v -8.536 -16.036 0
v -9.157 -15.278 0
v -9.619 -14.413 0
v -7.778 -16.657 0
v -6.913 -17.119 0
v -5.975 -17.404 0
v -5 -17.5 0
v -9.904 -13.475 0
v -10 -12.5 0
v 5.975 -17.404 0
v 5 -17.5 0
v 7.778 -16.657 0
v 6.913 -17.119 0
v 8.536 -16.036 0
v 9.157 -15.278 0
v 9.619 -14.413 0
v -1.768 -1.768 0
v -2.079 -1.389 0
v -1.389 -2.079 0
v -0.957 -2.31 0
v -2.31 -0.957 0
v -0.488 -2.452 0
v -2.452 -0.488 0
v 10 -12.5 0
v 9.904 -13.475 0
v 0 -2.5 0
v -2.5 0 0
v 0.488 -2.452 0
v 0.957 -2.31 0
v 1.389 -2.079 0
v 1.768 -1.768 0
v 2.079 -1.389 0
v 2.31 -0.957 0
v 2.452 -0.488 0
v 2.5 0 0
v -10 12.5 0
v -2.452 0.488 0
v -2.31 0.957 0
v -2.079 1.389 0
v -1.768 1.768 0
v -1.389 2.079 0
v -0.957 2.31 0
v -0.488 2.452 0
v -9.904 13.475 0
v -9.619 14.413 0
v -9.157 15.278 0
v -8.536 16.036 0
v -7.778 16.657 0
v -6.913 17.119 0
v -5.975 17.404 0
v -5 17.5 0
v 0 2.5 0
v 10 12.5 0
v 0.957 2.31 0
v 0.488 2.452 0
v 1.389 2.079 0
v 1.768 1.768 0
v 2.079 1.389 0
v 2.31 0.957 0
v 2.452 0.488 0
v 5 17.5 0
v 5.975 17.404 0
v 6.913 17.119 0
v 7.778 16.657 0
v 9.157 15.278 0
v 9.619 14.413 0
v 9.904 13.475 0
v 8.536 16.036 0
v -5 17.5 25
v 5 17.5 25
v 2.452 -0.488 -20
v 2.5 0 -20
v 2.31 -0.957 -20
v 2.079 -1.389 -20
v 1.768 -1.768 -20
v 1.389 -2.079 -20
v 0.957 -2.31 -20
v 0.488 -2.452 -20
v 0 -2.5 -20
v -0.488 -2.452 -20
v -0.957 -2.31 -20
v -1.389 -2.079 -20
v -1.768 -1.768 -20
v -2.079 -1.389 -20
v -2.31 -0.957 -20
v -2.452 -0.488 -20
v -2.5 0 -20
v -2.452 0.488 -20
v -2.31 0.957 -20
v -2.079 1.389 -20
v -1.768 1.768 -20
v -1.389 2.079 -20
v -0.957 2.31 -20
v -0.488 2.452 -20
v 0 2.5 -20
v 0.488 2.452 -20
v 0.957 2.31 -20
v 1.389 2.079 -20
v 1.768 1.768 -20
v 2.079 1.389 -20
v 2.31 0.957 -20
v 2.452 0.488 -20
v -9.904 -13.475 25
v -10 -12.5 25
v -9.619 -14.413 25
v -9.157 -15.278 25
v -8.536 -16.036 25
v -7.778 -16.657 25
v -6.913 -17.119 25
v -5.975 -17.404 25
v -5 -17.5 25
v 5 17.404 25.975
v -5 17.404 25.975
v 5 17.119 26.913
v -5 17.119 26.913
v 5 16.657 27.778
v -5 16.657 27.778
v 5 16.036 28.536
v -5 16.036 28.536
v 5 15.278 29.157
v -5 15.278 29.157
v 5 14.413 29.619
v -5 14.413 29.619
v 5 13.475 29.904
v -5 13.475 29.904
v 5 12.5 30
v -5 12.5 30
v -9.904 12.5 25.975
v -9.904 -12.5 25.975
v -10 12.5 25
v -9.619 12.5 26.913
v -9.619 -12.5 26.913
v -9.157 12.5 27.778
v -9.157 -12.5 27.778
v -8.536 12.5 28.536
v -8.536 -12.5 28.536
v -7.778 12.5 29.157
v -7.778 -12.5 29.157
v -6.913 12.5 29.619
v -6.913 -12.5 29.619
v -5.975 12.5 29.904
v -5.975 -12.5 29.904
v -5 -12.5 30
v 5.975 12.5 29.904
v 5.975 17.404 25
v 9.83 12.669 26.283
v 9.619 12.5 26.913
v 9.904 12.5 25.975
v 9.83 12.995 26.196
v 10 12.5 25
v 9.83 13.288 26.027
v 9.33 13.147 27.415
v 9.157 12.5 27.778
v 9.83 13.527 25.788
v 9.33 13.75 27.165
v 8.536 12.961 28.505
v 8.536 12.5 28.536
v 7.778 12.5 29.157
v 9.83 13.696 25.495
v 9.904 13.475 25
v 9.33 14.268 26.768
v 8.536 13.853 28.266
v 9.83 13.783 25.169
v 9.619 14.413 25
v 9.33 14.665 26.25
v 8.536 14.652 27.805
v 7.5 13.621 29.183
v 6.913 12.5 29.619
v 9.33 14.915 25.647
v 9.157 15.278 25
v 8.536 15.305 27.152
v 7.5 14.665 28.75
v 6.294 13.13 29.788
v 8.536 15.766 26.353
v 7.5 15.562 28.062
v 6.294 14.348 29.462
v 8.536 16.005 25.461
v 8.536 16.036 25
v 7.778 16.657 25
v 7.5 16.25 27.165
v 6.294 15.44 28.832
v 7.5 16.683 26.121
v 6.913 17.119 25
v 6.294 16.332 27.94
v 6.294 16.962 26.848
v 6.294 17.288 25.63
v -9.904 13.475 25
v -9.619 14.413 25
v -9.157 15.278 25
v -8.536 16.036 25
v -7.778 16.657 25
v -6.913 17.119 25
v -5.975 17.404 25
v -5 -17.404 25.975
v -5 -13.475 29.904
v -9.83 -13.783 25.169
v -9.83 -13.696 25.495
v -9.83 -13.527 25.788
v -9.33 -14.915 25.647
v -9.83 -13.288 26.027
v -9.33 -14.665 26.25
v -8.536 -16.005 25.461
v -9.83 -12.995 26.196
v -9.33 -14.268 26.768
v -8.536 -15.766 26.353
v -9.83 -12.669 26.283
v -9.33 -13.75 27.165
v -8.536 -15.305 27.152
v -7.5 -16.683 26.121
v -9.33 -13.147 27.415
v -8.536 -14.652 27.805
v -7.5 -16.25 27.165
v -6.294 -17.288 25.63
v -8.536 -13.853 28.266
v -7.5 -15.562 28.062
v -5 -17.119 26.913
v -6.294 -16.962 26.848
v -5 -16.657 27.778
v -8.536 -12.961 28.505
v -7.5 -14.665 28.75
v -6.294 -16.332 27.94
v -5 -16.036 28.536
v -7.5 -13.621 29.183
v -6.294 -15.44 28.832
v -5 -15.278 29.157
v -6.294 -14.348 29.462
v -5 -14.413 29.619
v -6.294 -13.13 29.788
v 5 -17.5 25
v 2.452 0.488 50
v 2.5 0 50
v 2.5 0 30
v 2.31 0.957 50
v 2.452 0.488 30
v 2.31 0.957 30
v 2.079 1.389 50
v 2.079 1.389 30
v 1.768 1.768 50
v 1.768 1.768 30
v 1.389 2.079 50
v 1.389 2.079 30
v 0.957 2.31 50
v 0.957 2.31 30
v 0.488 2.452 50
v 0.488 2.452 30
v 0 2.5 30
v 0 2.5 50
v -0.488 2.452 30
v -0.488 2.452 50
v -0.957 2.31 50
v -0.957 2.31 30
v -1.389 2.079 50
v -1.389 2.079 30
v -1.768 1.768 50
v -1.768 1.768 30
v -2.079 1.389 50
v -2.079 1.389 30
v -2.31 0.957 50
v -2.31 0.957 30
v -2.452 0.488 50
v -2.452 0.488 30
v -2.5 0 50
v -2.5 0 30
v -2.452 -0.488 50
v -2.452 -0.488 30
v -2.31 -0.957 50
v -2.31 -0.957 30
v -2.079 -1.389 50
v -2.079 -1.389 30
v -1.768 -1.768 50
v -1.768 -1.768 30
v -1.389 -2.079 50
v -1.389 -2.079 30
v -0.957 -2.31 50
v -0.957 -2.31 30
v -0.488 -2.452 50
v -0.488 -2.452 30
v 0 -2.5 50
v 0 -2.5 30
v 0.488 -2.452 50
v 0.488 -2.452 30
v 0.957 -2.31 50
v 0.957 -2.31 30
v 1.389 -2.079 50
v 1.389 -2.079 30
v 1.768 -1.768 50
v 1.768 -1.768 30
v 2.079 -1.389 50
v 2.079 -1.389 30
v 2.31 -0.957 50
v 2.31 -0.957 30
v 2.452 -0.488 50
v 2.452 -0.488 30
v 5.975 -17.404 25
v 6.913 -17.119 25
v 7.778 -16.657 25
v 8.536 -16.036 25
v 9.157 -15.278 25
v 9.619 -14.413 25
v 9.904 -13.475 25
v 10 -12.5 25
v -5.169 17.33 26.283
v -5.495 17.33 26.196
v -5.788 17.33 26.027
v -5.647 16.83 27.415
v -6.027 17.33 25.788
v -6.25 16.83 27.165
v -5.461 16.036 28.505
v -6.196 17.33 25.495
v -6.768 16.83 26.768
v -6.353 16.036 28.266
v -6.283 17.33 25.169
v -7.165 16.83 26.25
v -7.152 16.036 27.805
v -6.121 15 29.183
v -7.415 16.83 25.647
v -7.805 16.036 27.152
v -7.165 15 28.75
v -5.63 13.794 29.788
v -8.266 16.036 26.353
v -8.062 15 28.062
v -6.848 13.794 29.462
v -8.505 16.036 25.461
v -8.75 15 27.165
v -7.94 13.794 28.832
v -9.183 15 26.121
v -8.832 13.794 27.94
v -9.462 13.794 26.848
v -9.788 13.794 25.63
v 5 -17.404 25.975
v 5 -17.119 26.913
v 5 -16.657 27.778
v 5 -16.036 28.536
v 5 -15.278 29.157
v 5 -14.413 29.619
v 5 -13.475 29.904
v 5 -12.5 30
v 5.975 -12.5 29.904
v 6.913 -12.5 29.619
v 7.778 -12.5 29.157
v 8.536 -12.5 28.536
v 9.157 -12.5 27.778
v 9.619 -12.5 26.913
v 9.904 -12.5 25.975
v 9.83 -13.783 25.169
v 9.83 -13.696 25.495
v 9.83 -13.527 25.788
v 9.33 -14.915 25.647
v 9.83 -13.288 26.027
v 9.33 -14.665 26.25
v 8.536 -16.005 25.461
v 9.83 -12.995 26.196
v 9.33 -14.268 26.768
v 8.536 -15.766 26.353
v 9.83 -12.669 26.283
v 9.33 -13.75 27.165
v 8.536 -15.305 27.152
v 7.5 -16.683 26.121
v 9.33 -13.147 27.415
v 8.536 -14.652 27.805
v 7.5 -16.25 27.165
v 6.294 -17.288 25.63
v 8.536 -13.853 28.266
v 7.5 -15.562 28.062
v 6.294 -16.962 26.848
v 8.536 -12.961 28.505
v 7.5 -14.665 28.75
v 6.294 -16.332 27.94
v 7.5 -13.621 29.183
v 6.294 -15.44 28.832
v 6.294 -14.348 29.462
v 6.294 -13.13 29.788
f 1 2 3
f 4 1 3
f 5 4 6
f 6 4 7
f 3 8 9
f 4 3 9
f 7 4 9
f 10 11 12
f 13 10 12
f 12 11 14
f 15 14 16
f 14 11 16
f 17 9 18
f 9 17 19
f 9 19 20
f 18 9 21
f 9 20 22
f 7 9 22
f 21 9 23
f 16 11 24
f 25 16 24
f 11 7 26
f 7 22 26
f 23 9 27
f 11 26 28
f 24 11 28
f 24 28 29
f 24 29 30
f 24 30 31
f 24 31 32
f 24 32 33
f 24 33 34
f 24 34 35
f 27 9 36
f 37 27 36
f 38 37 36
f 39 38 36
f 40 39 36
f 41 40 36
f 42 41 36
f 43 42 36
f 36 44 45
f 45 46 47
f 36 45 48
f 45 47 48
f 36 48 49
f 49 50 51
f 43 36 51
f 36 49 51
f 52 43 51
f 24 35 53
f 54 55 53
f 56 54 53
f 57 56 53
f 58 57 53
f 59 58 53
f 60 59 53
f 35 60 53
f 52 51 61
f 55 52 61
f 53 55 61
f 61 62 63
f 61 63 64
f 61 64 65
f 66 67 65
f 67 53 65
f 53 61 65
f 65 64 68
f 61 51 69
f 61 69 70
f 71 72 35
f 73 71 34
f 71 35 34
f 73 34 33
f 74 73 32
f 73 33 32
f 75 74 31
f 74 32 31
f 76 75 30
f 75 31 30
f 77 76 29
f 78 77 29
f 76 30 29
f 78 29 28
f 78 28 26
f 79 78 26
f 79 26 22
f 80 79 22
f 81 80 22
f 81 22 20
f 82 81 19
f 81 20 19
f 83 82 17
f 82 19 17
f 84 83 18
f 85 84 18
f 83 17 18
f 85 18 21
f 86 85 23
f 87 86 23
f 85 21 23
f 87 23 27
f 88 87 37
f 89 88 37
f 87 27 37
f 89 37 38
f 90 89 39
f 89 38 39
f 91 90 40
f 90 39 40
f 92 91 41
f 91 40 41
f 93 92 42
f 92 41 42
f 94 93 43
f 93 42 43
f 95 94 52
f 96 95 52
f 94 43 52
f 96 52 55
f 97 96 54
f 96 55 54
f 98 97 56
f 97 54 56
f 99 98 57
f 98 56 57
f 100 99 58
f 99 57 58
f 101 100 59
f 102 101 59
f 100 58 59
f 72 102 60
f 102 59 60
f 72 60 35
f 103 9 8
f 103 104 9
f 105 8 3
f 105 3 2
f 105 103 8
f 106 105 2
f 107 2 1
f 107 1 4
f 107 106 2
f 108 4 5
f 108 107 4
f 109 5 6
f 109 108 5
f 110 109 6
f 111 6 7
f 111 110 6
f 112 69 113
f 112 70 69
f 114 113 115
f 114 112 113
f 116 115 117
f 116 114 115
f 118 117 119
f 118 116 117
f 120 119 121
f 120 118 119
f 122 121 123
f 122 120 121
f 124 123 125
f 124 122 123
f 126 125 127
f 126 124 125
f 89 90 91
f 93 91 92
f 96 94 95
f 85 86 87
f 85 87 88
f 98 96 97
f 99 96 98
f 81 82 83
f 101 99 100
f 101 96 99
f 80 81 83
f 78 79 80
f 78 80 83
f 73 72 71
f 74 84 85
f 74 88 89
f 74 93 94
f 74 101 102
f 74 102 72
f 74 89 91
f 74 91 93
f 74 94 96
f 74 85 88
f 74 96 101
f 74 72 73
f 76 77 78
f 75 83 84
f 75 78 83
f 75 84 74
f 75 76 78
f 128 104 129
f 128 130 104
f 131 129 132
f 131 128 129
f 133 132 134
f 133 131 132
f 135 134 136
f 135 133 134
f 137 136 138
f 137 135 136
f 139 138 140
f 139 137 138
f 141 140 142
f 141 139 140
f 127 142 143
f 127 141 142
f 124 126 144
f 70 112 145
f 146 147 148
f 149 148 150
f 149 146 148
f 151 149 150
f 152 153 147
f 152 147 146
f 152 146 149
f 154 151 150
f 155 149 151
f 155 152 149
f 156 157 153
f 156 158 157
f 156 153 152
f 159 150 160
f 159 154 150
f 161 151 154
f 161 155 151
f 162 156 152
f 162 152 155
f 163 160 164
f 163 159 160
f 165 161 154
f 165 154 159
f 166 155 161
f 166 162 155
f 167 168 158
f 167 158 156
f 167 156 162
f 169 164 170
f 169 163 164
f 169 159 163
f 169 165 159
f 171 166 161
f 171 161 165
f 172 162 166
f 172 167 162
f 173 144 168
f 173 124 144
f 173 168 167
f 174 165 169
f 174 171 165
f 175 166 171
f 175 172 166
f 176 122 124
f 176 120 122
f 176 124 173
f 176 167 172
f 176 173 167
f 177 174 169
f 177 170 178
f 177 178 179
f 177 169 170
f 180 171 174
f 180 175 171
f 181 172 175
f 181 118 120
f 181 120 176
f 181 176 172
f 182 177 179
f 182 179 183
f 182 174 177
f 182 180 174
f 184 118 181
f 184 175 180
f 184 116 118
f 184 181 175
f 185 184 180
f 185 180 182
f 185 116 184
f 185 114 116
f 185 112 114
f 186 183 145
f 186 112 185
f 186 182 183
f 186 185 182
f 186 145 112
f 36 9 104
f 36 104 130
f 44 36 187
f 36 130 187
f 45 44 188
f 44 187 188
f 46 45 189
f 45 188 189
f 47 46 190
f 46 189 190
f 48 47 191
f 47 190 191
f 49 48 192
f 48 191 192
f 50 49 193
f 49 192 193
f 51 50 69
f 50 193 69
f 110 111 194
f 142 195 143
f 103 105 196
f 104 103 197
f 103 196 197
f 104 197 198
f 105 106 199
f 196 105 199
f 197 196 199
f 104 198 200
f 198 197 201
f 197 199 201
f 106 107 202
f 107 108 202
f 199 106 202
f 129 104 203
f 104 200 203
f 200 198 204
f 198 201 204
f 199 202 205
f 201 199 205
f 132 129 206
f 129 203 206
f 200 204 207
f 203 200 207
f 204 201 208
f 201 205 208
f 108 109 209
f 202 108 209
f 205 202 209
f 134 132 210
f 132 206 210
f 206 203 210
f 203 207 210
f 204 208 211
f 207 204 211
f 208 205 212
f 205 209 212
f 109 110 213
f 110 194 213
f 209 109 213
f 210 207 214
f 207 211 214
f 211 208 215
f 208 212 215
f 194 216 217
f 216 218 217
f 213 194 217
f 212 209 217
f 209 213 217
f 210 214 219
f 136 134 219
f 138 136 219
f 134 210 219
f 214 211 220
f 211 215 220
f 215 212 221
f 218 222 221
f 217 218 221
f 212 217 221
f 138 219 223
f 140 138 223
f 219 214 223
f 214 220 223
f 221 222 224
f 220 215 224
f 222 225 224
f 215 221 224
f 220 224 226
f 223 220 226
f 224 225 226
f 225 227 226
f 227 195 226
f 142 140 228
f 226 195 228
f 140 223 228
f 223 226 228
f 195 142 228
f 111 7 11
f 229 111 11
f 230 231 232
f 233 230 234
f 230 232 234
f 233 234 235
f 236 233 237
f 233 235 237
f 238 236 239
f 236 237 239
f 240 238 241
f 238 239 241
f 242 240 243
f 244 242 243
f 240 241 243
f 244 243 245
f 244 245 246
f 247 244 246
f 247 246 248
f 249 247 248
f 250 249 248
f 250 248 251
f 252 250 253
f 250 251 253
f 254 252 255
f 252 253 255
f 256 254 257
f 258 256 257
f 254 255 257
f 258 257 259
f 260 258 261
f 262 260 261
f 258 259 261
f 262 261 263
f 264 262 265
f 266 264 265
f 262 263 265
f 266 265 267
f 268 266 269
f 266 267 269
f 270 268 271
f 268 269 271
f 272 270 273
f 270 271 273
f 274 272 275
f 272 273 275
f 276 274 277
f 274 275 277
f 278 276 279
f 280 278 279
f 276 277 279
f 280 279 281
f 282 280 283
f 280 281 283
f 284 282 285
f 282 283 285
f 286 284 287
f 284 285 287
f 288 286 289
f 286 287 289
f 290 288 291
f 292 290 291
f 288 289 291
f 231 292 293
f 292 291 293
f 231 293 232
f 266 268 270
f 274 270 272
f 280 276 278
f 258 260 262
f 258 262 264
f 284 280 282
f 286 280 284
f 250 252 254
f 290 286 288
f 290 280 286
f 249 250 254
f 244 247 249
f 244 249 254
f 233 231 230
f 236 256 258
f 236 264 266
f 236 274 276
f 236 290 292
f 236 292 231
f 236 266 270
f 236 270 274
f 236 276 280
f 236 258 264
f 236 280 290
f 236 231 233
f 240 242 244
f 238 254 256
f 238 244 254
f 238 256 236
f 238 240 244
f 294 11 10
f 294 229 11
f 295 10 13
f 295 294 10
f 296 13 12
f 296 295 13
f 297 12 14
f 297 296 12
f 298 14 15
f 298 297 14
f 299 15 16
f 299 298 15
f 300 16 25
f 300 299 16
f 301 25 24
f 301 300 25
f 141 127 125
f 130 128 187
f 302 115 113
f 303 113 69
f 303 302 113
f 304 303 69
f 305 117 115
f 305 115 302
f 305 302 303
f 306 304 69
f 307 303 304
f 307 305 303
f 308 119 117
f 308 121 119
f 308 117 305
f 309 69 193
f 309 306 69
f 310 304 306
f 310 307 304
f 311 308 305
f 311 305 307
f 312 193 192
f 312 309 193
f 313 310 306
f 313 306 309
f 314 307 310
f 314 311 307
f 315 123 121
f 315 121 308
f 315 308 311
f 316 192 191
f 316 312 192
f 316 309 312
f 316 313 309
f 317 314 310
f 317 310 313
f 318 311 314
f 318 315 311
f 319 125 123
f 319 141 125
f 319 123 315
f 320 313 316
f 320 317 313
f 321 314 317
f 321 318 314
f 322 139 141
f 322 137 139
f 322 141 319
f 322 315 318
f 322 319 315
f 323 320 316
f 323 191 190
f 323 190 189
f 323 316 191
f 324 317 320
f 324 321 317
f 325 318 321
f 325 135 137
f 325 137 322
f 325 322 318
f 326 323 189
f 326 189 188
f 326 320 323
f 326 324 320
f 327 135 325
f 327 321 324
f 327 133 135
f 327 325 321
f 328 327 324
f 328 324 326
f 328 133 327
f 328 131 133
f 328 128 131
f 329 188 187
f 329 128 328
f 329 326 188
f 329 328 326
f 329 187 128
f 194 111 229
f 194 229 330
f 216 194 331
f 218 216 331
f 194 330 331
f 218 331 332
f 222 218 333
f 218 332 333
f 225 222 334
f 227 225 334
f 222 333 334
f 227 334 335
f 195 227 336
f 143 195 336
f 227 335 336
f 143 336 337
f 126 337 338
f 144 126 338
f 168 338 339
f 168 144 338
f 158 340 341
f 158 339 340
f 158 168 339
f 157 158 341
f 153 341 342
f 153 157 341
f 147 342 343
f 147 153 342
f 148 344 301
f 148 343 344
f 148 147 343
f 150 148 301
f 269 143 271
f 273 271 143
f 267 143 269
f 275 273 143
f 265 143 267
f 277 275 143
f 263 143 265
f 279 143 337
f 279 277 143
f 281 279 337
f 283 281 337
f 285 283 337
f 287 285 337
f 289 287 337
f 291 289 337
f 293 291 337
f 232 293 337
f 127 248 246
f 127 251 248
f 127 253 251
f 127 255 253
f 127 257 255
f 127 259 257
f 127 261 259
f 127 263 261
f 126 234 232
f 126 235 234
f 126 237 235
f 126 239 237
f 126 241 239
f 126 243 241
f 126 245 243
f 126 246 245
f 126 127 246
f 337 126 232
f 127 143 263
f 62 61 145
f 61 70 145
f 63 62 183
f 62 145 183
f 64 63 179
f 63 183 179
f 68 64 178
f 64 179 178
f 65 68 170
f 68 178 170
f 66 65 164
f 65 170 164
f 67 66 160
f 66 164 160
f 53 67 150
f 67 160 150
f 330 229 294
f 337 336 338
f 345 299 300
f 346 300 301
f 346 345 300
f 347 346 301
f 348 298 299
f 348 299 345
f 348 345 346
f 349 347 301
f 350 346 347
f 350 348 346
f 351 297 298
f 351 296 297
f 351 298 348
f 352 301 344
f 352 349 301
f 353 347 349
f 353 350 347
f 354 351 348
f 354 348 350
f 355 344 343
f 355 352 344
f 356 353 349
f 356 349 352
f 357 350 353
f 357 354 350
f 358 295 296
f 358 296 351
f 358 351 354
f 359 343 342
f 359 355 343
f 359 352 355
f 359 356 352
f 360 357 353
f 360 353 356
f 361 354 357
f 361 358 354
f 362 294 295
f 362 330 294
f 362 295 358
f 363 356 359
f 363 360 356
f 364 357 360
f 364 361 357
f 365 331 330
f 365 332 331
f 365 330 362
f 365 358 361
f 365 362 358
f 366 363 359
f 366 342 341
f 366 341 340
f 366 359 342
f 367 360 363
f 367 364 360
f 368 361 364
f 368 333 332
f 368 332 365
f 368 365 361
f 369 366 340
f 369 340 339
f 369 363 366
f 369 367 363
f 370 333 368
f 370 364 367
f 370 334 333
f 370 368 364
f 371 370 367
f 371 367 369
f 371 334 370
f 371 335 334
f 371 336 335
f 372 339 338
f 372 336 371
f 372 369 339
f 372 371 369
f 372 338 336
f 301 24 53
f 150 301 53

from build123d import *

# Parameters (mm, degrees)
F0_W     = 20
F0_H     = 35
F1_DEPTH = 30
F2_R     = 2.5
F3_DEPTH = 20
F4_R     = 5
F5_R     = 2.5
F6_DEPTH = 20


with BuildPart() as f1:
    # F0 (on Top) → F1 (new body)
    with BuildSketch(Plane.XY):
        Rectangle(F0_W, F0_H)
    extrude(amount=F1_DEPTH)

    # F2 (on face) → F3 (join)
    with BuildSketch(Plane.XY.offset(30)):
        Circle(F2_R)
    extrude(amount=F3_DEPTH)

    # F4
    f4_edges = [f1.edges().sort_by_distance(p)[0] for p in [
        (0, -17.5, 30),
        (10, -17.5, 15),
        (-10, -17.5, 15),
        (-10, 0, 30),
        (0, 17.5, 30),
        (10, 0, 30),
        (10, 17.5, 15),
        (-10, 17.5, 15),
    ]]
    fillet(f4_edges, radius=F4_R)

    # F5 (on face) → F6 (join)
    with BuildSketch(Plane(origin=(0, 0, 0), x_dir=(1, 0, 0), z_dir=(0, 0, -1))):
        Circle(F5_R)
    extrude(amount=F6_DEPTH)


solid = f1.part
